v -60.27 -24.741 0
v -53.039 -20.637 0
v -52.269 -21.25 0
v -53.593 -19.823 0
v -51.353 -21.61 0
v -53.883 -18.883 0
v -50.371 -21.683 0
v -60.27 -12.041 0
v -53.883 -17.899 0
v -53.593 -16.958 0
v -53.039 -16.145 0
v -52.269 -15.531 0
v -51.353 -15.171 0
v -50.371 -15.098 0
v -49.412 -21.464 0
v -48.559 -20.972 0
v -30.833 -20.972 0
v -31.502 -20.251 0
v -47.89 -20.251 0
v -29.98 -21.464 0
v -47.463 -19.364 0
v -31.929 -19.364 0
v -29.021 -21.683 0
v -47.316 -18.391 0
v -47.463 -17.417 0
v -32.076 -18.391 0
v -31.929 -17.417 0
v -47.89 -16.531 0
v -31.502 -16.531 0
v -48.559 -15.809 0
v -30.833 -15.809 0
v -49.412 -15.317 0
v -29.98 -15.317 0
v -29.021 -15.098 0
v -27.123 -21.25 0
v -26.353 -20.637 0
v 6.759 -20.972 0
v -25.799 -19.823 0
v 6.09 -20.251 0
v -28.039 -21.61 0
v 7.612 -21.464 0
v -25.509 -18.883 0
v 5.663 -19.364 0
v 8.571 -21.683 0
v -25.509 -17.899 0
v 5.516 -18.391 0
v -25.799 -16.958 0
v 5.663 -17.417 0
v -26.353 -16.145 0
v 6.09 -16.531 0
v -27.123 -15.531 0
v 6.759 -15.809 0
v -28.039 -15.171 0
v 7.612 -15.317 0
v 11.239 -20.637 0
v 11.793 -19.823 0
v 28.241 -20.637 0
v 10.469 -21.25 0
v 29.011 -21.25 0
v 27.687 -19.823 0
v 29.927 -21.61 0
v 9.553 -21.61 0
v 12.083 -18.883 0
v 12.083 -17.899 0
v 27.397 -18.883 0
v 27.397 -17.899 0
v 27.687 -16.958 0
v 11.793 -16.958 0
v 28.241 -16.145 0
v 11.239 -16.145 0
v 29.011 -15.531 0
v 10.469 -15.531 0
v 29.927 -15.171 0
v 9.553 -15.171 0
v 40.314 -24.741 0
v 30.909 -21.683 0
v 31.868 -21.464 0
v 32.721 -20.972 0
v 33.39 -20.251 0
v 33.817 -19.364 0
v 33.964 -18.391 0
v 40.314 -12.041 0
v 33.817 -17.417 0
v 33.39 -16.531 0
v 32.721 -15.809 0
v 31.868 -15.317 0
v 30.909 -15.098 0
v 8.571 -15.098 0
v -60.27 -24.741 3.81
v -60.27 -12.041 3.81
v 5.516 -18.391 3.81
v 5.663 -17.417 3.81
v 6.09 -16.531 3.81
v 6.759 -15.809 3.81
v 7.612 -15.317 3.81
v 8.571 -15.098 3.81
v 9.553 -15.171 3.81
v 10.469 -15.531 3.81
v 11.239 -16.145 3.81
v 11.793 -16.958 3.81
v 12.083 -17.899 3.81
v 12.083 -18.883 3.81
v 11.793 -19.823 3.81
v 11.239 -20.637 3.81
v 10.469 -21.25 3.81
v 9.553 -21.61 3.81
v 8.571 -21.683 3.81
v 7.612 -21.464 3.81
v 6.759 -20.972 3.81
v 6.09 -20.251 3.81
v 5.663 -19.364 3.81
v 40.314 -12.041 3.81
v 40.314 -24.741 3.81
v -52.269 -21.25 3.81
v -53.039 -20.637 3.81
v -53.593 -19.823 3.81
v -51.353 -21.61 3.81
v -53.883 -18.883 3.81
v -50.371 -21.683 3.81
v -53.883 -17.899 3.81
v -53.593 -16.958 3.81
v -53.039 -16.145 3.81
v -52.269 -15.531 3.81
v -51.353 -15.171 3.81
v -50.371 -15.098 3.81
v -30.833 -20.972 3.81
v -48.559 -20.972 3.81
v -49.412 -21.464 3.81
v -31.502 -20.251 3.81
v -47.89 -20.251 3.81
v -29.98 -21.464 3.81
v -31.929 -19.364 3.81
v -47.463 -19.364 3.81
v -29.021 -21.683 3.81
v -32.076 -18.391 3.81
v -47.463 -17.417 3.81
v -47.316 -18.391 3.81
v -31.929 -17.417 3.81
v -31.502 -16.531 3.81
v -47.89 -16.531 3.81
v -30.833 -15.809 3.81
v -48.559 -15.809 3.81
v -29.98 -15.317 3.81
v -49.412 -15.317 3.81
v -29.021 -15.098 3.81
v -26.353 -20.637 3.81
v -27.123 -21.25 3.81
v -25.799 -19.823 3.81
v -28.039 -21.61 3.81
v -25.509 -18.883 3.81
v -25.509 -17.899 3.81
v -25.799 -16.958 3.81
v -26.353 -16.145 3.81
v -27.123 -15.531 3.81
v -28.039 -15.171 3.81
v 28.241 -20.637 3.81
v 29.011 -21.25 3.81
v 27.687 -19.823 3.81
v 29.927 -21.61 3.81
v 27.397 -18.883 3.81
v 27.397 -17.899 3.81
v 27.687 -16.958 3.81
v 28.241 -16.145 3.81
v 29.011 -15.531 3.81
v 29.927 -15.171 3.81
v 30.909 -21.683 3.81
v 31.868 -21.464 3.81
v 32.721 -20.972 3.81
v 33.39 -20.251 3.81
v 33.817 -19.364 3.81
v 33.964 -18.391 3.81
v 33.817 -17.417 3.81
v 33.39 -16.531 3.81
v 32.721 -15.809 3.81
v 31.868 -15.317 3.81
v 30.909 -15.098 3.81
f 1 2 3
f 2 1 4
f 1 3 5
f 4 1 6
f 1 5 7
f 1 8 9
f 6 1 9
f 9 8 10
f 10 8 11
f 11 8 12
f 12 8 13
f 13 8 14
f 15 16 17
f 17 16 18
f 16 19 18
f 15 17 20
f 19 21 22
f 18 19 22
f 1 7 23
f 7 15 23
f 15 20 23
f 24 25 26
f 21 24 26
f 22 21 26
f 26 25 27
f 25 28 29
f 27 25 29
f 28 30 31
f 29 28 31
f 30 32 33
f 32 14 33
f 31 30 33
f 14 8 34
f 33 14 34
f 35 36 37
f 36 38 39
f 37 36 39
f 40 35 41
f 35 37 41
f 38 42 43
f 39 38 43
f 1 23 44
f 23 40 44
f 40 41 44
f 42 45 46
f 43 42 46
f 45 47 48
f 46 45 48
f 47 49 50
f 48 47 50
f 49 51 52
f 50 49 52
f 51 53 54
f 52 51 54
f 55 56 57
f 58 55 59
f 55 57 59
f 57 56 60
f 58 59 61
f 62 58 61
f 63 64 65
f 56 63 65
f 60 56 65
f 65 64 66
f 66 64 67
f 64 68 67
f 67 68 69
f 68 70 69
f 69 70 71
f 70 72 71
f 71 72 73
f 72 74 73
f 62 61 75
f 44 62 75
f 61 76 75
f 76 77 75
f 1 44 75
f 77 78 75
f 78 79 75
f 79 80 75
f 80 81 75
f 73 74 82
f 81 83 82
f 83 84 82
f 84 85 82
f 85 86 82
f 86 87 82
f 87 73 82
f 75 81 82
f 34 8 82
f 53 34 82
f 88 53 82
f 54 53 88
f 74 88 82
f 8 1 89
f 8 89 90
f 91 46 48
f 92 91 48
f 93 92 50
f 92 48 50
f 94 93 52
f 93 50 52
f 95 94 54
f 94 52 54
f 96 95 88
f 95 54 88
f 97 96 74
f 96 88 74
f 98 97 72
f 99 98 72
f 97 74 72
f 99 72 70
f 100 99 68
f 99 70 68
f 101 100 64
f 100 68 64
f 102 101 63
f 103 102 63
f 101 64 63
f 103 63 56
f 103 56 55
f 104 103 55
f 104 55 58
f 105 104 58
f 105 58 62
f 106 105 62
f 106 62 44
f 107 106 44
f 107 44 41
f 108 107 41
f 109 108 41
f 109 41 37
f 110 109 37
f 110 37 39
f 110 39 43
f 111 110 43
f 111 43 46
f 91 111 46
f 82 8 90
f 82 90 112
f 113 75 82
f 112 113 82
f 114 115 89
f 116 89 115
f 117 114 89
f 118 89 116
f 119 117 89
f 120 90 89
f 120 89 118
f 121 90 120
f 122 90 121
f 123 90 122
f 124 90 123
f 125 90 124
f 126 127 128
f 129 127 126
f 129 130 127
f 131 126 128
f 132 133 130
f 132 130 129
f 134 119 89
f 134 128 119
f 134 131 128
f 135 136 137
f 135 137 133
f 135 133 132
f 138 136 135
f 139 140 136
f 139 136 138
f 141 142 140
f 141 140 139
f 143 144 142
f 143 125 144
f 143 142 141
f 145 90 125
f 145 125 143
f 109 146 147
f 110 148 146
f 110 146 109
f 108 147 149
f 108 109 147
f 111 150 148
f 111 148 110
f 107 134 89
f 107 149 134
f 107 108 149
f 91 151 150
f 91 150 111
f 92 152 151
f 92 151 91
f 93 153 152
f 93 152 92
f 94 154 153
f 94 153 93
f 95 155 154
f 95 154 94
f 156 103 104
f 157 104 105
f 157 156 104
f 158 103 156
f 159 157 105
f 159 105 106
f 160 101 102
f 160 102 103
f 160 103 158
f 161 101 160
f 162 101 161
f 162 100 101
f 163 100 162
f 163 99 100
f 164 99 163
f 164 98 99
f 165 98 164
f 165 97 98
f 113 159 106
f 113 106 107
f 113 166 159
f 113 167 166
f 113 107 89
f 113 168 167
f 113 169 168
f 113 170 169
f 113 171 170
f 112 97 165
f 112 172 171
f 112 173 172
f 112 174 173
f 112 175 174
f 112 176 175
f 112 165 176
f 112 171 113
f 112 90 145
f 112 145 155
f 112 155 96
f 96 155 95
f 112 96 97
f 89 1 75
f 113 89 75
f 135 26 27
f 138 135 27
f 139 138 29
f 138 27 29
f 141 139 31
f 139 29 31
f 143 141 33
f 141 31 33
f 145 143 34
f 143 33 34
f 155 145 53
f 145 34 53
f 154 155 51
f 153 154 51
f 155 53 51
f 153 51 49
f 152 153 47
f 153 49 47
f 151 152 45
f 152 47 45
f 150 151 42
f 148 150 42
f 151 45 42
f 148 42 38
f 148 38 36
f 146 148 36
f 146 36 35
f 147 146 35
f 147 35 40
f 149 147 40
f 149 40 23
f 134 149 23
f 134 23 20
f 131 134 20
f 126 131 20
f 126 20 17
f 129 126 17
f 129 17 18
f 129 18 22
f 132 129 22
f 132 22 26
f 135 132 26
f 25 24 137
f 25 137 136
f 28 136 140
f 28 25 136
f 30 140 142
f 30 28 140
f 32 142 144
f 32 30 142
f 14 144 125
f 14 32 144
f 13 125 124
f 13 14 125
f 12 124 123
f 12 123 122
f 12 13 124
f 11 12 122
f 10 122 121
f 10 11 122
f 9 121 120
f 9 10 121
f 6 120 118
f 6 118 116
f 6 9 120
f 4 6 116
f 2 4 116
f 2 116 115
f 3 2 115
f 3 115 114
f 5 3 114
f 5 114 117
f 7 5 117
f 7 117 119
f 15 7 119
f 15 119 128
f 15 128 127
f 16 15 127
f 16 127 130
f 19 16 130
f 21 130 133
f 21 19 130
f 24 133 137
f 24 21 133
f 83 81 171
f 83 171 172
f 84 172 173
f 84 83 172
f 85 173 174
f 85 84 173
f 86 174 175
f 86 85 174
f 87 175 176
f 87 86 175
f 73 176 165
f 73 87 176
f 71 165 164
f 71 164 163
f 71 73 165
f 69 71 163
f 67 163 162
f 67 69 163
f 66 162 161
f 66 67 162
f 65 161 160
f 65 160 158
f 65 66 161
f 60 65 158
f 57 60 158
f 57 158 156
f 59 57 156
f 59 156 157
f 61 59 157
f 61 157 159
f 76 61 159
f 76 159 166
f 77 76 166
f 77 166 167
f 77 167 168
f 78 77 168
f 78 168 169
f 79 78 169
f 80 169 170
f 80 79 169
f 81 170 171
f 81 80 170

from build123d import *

# Parameters (mm, degrees)
SKETCH1_W           = 100.584
SKETCH1_H           = 12.7
SKETCH1_R           = 3.302
BOSS_EXTRUDE2_DEPTH = 3.81
CUT_EXTRUDE1_REACH  = 5.81
SKETCH2_R           = 3.302


with BuildPart() as part:
    # Sketch1 → Boss-Extrude2 (new body)
    with BuildSketch(Plane.XY):
        with Locations((-9.978006062, -18.390640797)):
            Rectangle(SKETCH1_W, SKETCH1_H)
        with Locations((30.661993938, -18.390640797)):
            Circle(SKETCH1_R, mode=Mode.SUBTRACT)
        with Locations((-50.618006062, -18.390640797)):
            Circle(SKETCH1_R, mode=Mode.SUBTRACT)
    extrude(amount=BOSS_EXTRUDE2_DEPTH)

    # Sketch2 → Cut-Extrude1 (cut, up to next)
    with BuildSketch(Plane(origin=(0, 0, 0), x_dir=(-1, 0, 0), z_dir=(0, 0, -1)), mode=Mode.PRIVATE) as cut_extrude1_sk1:
        with Locations((28.774006062, -18.390640797)):
            Circle(SKETCH2_R)
    cut_extrude1_tool1 = extrude(cut_extrude1_sk1.sketch, amount=-CUT_EXTRUDE1_REACH, mode=Mode.PRIVATE) & part.part
    add(cut_extrude1_tool1.solids().sort_by_distance((-28.774006, -18.390641, 0))[0], mode=Mode.SUBTRACT)
    # Sketch2 → Cut-Extrude1 (cut, up to next)
    with BuildSketch(Plane(origin=(0, 0, 0), x_dir=(-1, 0, 0), z_dir=(0, 0, -1)), mode=Mode.PRIVATE) as cut_extrude1_sk2:
        with Locations((-8.817993938, -18.390640797)):
            Circle(SKETCH2_R)
    cut_extrude1_tool2 = extrude(cut_extrude1_sk2.sketch, amount=-CUT_EXTRUDE1_REACH, mode=Mode.PRIVATE) & part.part
    add(cut_extrude1_tool2.solids().sort_by_distance((8.817994, -18.390641, 0))[0], mode=Mode.SUBTRACT)


solid = part.part
